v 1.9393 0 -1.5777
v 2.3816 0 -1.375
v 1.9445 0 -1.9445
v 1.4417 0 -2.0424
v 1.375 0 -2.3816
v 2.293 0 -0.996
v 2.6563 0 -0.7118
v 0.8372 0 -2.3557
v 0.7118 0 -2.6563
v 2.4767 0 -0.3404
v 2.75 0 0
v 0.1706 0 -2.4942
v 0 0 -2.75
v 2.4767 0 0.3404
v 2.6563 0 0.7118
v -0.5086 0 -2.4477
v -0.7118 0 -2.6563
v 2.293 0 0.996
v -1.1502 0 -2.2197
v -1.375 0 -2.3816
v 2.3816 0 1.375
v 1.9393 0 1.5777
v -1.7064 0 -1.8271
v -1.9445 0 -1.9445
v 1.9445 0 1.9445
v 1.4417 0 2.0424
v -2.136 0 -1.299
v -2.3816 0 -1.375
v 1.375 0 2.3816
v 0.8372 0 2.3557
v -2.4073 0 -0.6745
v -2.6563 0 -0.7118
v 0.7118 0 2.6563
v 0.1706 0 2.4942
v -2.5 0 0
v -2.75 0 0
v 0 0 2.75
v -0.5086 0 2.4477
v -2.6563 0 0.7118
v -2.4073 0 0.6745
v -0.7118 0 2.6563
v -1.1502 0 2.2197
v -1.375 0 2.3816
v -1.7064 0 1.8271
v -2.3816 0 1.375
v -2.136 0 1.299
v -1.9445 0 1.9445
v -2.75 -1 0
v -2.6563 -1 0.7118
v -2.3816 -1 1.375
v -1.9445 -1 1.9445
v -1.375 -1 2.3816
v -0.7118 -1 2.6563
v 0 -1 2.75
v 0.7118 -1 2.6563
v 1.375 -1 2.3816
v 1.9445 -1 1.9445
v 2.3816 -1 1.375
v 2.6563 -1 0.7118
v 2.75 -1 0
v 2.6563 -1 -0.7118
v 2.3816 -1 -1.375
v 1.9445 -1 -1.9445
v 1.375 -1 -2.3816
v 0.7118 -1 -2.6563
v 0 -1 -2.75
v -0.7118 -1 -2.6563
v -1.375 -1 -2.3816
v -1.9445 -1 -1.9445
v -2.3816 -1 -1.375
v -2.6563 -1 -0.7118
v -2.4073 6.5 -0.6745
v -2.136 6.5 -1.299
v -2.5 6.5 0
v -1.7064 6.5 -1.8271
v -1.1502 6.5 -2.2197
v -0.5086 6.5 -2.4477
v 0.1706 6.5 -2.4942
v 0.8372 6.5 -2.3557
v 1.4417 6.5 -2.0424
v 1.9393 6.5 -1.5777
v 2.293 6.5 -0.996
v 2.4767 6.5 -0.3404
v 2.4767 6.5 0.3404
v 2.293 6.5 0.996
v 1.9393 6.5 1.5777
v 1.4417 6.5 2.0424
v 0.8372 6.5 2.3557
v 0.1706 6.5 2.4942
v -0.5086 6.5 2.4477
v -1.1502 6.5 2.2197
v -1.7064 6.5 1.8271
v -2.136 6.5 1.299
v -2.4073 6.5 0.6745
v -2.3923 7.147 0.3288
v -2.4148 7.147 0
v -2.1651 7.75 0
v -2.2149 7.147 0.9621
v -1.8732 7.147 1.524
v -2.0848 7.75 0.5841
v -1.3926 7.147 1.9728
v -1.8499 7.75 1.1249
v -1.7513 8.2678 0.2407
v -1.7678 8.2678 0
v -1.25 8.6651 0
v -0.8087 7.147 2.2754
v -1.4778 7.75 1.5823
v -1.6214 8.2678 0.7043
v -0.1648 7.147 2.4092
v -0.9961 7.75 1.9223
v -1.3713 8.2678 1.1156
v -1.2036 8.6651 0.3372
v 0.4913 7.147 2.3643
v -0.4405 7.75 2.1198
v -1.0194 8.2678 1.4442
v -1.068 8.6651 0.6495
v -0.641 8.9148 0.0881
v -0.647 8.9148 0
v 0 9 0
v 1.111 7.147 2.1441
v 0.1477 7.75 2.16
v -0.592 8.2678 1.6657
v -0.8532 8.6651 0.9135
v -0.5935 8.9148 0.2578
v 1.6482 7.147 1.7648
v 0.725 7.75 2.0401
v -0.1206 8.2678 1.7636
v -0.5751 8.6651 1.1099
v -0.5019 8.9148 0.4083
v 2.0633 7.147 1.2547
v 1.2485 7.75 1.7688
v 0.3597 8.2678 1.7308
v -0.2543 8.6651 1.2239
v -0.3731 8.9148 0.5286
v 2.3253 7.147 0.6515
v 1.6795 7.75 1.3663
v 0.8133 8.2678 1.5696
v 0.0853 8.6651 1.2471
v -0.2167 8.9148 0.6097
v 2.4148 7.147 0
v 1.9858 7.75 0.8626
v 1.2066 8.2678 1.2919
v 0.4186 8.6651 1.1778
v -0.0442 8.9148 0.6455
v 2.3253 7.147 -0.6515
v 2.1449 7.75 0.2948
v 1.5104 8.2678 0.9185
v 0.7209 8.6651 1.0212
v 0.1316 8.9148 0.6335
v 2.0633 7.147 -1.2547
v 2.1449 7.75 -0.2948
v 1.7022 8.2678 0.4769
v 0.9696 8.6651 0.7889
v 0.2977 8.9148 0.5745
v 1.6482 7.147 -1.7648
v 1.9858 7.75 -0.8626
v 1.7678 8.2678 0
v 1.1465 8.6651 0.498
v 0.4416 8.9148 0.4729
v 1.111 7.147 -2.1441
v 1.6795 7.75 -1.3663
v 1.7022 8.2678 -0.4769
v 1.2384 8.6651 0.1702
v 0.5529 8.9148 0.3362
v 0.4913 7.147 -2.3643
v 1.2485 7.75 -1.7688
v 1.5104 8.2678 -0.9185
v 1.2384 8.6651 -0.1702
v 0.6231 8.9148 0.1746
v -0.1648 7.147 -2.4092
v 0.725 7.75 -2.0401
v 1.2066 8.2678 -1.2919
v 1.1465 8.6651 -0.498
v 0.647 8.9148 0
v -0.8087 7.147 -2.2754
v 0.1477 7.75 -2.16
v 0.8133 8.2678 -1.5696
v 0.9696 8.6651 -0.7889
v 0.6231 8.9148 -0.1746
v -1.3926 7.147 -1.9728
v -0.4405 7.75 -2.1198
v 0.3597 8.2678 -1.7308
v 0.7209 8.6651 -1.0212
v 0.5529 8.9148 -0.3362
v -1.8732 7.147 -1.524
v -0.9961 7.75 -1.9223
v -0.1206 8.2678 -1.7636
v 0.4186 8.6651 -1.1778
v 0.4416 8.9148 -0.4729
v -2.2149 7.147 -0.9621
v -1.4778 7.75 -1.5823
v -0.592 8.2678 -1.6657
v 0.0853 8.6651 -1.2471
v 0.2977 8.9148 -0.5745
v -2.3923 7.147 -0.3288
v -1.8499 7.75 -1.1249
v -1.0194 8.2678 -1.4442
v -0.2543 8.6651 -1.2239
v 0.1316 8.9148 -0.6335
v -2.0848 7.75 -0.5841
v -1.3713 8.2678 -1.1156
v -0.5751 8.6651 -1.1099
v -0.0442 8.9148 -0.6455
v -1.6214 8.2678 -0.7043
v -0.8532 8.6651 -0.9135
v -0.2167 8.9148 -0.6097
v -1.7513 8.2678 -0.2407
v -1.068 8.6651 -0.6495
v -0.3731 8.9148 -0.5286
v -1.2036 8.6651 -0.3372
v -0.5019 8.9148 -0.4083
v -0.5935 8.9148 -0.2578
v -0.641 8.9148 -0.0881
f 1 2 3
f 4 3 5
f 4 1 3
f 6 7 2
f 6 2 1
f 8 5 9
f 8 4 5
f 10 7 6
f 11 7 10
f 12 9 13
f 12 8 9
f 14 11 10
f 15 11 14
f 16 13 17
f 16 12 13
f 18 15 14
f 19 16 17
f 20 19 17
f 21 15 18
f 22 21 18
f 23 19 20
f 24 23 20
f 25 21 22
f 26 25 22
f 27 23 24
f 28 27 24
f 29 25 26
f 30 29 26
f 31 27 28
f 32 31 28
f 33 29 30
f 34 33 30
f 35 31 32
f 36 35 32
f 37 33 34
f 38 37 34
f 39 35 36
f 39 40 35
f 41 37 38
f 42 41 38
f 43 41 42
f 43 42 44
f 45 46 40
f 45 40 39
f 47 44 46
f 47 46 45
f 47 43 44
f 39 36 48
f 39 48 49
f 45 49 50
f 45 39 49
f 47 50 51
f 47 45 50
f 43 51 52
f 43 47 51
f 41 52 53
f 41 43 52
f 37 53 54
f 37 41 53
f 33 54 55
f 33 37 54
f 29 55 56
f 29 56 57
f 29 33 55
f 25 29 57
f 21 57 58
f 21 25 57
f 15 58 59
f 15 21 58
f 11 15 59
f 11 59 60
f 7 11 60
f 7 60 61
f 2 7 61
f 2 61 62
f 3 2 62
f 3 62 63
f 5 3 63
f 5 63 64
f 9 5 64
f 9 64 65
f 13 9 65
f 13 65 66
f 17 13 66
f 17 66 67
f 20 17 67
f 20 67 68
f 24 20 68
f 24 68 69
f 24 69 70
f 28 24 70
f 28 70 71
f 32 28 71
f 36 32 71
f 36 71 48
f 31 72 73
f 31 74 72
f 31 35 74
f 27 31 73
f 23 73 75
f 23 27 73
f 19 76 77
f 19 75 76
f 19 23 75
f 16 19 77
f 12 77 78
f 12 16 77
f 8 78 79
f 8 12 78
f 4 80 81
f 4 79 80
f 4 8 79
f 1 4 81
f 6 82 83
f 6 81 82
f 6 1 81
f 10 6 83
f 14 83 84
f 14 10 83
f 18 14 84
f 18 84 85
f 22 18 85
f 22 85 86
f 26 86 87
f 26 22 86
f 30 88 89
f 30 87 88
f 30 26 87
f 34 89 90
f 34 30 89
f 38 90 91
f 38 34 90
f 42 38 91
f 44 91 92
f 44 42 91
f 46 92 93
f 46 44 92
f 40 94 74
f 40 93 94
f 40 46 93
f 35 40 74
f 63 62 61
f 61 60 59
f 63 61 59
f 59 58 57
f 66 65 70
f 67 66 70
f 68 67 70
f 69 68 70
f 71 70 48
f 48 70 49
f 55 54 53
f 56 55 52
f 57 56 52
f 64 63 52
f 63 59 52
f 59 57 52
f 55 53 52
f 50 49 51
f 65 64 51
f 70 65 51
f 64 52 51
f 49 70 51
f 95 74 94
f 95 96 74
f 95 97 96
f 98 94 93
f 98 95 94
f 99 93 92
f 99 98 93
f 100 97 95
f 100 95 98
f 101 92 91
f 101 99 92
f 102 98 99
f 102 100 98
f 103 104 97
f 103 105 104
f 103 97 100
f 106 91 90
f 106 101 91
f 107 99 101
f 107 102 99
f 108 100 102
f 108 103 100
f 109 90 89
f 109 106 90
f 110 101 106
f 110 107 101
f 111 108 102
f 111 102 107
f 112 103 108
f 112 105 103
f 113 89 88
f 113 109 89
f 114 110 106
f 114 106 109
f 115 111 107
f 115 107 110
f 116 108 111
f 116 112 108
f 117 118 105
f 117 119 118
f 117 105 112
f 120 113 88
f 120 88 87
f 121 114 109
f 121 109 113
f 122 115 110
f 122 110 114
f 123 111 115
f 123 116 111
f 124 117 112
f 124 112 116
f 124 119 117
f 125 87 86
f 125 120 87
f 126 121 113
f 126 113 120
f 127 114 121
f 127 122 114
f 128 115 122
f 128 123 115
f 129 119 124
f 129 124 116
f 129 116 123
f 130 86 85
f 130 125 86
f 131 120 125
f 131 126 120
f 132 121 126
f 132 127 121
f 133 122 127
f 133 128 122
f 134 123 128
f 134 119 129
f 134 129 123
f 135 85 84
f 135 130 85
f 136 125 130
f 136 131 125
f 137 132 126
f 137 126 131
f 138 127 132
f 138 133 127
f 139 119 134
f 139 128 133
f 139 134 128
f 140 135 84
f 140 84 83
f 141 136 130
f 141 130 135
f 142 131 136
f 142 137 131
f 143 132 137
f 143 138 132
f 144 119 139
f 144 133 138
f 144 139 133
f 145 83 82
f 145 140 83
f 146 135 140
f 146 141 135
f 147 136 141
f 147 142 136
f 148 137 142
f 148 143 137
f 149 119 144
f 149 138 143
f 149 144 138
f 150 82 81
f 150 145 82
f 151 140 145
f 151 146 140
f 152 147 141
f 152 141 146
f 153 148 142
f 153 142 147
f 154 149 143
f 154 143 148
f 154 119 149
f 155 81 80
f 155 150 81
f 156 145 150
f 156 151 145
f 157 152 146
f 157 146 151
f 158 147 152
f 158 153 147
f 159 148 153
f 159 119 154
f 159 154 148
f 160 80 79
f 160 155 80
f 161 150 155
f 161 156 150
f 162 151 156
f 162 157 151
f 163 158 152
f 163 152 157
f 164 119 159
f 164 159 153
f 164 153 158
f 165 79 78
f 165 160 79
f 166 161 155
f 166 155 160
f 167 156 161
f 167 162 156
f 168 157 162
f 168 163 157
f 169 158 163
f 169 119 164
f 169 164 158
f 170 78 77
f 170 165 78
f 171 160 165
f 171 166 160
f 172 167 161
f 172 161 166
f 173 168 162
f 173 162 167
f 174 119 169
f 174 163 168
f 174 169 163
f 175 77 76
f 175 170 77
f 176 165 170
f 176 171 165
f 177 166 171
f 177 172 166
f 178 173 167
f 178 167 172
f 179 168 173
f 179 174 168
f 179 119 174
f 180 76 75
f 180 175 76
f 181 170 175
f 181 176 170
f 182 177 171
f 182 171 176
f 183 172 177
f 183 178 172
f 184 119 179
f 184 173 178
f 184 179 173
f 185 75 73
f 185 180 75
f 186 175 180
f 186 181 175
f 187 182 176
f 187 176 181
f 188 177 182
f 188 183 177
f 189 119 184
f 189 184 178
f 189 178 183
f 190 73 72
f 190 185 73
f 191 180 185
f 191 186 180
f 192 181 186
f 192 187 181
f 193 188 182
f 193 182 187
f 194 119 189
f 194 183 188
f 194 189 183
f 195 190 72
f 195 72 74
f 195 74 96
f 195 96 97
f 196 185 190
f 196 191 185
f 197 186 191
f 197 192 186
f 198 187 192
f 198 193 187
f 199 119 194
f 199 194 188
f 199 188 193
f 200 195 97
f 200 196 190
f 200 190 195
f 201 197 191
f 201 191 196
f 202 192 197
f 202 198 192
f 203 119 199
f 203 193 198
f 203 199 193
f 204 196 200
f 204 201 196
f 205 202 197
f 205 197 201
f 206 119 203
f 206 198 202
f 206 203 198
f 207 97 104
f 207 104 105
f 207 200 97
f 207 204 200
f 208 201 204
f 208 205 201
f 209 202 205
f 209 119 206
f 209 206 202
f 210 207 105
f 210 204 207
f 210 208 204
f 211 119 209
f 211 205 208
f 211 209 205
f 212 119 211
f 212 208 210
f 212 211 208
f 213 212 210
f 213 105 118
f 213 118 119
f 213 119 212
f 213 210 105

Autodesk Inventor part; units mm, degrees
ref_plane "YZ Plane" through (0, 0, 0) normal (1, 0, 0) x (0, 1, 0)
ref_plane "XZ Plane" through (0, 0, 0) normal (0, 1, 0) x (-1, 0, 0)
ref_plane "XY Plane" through (0, 0, 0) normal (0, 0, 1) x (1, 0, 0)
sketch "Skizze2" plane through (0, 0, 0) normal (0, 1, 0) x (-1, 0, 0)
  circle A0 centre (0, 0) radius 2.5
  circle A1 centre (0, 0) radius 2.75
  dimension "d0" = 5
  dimension "d4" = 0.25
extrude "Extrusion1" add sketch "Skizze2" along normal blind 9 contours A0
fillet "Rundung1" radius 2.5 1 edges at (2.5, 9, 0)
extrude "Extrusion2" add sketch "Skizze2" against normal blind 1 contours A0 | A1
properties part number "Head" material "Glas"
